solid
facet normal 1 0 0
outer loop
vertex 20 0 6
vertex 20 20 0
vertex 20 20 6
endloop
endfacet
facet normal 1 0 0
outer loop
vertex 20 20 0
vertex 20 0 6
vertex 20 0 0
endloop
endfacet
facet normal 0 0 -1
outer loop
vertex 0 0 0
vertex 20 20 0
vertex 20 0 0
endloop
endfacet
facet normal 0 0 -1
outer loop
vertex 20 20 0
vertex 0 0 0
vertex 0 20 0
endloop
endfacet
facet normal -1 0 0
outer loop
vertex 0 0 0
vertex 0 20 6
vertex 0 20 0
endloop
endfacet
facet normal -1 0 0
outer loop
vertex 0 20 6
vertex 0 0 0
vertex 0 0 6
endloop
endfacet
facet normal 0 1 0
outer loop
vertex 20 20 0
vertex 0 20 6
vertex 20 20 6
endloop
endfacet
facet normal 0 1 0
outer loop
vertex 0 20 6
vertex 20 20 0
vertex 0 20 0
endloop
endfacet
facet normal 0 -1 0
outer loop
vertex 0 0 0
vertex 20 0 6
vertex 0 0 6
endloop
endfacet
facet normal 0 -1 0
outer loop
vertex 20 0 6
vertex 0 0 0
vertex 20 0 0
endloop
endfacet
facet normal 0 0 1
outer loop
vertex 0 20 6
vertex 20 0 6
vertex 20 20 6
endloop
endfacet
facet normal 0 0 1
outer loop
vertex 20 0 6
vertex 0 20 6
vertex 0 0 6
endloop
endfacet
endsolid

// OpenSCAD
altura=1;
lados=20;
rep=6;
color1="red";
color2="white";
color1boolean=true;
color2boolean=true;



for (i=[0:altura:altura*(rep-1)]) {
  if ((i/altura)%2==0) {
    if (color1boolean) translate([0,0,i]) color(color1) cube([lados,lados,altura]);
  } else {
    if (color2boolean) translate([0,0,i]) color(color2) cube([lados,lados,altura]);
  }

}
